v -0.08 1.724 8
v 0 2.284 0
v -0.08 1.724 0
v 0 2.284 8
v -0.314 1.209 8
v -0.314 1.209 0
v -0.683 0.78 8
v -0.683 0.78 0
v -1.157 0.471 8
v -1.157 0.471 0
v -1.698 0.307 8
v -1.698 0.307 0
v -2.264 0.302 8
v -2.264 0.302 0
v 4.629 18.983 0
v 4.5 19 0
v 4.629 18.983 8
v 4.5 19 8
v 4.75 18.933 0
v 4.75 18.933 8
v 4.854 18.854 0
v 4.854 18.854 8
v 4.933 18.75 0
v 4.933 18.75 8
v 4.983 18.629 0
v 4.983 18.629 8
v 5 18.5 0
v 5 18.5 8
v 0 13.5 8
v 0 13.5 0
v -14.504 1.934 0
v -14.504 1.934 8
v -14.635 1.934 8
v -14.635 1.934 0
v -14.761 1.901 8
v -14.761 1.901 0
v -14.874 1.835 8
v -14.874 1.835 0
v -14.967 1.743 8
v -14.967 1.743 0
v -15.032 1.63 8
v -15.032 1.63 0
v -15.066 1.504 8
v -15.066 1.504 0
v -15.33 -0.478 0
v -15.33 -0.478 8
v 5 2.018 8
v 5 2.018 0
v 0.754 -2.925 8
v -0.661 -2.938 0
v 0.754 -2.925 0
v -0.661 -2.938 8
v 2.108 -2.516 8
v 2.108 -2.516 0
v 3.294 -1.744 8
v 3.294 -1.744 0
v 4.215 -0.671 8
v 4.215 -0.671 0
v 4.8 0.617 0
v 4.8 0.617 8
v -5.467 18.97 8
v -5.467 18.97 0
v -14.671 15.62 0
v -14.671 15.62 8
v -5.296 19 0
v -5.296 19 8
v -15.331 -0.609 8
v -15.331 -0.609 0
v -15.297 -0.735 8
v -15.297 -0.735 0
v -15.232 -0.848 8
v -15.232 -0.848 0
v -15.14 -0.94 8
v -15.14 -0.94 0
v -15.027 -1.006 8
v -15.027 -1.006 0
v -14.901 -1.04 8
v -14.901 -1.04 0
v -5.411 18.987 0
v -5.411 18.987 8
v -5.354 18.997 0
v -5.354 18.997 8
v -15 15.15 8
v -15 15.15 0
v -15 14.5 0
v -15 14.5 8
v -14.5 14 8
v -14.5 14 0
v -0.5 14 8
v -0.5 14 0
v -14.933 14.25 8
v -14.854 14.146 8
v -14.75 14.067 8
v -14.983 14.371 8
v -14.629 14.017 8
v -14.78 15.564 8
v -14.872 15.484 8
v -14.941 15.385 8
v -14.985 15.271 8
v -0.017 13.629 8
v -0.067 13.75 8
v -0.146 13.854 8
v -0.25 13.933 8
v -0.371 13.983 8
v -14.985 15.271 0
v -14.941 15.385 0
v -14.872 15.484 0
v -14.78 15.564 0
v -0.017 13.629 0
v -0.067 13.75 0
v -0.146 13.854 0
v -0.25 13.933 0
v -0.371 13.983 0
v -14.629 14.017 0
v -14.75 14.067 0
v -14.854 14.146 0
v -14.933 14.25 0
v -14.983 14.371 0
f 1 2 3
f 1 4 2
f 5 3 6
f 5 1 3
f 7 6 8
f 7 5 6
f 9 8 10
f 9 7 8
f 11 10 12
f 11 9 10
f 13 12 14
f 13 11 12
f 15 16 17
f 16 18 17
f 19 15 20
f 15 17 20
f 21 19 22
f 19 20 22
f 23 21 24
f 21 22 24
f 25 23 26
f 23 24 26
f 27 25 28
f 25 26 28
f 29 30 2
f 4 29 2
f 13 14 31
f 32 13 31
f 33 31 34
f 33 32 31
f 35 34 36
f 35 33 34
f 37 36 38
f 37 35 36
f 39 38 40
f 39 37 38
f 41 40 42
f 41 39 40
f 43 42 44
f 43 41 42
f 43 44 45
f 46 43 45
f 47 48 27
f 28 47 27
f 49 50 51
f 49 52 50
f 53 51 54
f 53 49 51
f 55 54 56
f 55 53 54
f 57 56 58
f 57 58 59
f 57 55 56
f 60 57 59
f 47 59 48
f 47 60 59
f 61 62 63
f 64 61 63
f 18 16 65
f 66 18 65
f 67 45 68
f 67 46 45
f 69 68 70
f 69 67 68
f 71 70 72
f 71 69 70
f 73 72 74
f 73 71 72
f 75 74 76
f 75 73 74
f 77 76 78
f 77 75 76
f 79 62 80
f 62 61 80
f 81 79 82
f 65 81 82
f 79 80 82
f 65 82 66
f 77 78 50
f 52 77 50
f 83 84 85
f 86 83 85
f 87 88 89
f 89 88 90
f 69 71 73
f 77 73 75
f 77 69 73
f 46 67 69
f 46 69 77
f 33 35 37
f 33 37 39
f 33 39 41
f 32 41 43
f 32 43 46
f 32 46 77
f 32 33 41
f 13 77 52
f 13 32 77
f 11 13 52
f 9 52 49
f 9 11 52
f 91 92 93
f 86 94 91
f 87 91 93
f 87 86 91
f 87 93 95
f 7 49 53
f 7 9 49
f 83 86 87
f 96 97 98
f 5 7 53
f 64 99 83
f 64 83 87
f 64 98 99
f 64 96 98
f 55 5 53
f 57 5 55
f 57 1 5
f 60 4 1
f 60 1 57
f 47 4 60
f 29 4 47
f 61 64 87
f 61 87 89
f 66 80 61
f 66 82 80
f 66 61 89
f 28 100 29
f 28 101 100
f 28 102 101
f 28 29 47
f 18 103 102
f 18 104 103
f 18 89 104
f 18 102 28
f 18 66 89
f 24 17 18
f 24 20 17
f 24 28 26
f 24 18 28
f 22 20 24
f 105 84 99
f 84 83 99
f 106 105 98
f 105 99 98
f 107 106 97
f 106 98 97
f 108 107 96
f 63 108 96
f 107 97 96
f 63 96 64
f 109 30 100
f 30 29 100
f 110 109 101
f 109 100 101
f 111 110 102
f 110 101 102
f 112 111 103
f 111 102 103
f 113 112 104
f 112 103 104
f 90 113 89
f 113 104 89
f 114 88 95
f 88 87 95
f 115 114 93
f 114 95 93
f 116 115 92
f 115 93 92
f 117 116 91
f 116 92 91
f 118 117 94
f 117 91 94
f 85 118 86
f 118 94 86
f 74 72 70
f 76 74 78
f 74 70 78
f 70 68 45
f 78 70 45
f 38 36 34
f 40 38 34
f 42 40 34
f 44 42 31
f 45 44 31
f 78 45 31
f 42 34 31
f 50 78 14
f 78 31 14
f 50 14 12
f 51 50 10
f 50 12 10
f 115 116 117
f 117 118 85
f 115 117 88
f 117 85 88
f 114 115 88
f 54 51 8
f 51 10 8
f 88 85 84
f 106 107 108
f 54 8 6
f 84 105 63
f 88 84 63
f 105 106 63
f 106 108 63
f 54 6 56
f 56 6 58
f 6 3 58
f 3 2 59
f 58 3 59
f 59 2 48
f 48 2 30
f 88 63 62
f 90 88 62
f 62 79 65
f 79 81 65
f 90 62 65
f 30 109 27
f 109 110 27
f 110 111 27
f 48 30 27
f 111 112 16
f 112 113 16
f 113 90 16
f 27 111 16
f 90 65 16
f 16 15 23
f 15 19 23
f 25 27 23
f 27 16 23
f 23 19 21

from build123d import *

# Parameters (mm, degrees)
F1_DEPTH = 8
F2_R     = 2
F3_R     = 0.5
F4_R     = 5


with BuildPart() as f1:
    # F0 (on Top) → F1 (new body)
    with BuildSketch(Plane.XY):
        Polygon((0, 14), (0, 0), (-15, 2), (-15.396491, -0.973684), (5, -3.693216), (5, 19), (-5.383829, 19), (-15, 15.5), (-15, 14), align=None)
    extrude(amount=F1_DEPTH)

    # F2
    f2_edges = [f1.edges().sort_by_distance(p)[0] for p in [
        (0, 0, 4),
    ]]
    fillet(f2_edges, radius=F2_R)

    # F3
    f3_edges = [f1.edges().sort_by_distance(p)[0] for p in [
        (-15, 14, 4),
        (-15, 2, 4),
        (-15.396491, -0.973684, 4),
        (-15, 15.5, 4),
        (-5.383829, 19, 4),
        (0, 14, 4),
        (5, 19, 4),
    ]]
    fillet(f3_edges, radius=F3_R)

    # F4
    f4_edges = [f1.edges().sort_by_distance(p)[0] for p in [
        (5, -3.693216, 4),
    ]]
    fillet(f4_edges, radius=F4_R)


solid = f1.part
